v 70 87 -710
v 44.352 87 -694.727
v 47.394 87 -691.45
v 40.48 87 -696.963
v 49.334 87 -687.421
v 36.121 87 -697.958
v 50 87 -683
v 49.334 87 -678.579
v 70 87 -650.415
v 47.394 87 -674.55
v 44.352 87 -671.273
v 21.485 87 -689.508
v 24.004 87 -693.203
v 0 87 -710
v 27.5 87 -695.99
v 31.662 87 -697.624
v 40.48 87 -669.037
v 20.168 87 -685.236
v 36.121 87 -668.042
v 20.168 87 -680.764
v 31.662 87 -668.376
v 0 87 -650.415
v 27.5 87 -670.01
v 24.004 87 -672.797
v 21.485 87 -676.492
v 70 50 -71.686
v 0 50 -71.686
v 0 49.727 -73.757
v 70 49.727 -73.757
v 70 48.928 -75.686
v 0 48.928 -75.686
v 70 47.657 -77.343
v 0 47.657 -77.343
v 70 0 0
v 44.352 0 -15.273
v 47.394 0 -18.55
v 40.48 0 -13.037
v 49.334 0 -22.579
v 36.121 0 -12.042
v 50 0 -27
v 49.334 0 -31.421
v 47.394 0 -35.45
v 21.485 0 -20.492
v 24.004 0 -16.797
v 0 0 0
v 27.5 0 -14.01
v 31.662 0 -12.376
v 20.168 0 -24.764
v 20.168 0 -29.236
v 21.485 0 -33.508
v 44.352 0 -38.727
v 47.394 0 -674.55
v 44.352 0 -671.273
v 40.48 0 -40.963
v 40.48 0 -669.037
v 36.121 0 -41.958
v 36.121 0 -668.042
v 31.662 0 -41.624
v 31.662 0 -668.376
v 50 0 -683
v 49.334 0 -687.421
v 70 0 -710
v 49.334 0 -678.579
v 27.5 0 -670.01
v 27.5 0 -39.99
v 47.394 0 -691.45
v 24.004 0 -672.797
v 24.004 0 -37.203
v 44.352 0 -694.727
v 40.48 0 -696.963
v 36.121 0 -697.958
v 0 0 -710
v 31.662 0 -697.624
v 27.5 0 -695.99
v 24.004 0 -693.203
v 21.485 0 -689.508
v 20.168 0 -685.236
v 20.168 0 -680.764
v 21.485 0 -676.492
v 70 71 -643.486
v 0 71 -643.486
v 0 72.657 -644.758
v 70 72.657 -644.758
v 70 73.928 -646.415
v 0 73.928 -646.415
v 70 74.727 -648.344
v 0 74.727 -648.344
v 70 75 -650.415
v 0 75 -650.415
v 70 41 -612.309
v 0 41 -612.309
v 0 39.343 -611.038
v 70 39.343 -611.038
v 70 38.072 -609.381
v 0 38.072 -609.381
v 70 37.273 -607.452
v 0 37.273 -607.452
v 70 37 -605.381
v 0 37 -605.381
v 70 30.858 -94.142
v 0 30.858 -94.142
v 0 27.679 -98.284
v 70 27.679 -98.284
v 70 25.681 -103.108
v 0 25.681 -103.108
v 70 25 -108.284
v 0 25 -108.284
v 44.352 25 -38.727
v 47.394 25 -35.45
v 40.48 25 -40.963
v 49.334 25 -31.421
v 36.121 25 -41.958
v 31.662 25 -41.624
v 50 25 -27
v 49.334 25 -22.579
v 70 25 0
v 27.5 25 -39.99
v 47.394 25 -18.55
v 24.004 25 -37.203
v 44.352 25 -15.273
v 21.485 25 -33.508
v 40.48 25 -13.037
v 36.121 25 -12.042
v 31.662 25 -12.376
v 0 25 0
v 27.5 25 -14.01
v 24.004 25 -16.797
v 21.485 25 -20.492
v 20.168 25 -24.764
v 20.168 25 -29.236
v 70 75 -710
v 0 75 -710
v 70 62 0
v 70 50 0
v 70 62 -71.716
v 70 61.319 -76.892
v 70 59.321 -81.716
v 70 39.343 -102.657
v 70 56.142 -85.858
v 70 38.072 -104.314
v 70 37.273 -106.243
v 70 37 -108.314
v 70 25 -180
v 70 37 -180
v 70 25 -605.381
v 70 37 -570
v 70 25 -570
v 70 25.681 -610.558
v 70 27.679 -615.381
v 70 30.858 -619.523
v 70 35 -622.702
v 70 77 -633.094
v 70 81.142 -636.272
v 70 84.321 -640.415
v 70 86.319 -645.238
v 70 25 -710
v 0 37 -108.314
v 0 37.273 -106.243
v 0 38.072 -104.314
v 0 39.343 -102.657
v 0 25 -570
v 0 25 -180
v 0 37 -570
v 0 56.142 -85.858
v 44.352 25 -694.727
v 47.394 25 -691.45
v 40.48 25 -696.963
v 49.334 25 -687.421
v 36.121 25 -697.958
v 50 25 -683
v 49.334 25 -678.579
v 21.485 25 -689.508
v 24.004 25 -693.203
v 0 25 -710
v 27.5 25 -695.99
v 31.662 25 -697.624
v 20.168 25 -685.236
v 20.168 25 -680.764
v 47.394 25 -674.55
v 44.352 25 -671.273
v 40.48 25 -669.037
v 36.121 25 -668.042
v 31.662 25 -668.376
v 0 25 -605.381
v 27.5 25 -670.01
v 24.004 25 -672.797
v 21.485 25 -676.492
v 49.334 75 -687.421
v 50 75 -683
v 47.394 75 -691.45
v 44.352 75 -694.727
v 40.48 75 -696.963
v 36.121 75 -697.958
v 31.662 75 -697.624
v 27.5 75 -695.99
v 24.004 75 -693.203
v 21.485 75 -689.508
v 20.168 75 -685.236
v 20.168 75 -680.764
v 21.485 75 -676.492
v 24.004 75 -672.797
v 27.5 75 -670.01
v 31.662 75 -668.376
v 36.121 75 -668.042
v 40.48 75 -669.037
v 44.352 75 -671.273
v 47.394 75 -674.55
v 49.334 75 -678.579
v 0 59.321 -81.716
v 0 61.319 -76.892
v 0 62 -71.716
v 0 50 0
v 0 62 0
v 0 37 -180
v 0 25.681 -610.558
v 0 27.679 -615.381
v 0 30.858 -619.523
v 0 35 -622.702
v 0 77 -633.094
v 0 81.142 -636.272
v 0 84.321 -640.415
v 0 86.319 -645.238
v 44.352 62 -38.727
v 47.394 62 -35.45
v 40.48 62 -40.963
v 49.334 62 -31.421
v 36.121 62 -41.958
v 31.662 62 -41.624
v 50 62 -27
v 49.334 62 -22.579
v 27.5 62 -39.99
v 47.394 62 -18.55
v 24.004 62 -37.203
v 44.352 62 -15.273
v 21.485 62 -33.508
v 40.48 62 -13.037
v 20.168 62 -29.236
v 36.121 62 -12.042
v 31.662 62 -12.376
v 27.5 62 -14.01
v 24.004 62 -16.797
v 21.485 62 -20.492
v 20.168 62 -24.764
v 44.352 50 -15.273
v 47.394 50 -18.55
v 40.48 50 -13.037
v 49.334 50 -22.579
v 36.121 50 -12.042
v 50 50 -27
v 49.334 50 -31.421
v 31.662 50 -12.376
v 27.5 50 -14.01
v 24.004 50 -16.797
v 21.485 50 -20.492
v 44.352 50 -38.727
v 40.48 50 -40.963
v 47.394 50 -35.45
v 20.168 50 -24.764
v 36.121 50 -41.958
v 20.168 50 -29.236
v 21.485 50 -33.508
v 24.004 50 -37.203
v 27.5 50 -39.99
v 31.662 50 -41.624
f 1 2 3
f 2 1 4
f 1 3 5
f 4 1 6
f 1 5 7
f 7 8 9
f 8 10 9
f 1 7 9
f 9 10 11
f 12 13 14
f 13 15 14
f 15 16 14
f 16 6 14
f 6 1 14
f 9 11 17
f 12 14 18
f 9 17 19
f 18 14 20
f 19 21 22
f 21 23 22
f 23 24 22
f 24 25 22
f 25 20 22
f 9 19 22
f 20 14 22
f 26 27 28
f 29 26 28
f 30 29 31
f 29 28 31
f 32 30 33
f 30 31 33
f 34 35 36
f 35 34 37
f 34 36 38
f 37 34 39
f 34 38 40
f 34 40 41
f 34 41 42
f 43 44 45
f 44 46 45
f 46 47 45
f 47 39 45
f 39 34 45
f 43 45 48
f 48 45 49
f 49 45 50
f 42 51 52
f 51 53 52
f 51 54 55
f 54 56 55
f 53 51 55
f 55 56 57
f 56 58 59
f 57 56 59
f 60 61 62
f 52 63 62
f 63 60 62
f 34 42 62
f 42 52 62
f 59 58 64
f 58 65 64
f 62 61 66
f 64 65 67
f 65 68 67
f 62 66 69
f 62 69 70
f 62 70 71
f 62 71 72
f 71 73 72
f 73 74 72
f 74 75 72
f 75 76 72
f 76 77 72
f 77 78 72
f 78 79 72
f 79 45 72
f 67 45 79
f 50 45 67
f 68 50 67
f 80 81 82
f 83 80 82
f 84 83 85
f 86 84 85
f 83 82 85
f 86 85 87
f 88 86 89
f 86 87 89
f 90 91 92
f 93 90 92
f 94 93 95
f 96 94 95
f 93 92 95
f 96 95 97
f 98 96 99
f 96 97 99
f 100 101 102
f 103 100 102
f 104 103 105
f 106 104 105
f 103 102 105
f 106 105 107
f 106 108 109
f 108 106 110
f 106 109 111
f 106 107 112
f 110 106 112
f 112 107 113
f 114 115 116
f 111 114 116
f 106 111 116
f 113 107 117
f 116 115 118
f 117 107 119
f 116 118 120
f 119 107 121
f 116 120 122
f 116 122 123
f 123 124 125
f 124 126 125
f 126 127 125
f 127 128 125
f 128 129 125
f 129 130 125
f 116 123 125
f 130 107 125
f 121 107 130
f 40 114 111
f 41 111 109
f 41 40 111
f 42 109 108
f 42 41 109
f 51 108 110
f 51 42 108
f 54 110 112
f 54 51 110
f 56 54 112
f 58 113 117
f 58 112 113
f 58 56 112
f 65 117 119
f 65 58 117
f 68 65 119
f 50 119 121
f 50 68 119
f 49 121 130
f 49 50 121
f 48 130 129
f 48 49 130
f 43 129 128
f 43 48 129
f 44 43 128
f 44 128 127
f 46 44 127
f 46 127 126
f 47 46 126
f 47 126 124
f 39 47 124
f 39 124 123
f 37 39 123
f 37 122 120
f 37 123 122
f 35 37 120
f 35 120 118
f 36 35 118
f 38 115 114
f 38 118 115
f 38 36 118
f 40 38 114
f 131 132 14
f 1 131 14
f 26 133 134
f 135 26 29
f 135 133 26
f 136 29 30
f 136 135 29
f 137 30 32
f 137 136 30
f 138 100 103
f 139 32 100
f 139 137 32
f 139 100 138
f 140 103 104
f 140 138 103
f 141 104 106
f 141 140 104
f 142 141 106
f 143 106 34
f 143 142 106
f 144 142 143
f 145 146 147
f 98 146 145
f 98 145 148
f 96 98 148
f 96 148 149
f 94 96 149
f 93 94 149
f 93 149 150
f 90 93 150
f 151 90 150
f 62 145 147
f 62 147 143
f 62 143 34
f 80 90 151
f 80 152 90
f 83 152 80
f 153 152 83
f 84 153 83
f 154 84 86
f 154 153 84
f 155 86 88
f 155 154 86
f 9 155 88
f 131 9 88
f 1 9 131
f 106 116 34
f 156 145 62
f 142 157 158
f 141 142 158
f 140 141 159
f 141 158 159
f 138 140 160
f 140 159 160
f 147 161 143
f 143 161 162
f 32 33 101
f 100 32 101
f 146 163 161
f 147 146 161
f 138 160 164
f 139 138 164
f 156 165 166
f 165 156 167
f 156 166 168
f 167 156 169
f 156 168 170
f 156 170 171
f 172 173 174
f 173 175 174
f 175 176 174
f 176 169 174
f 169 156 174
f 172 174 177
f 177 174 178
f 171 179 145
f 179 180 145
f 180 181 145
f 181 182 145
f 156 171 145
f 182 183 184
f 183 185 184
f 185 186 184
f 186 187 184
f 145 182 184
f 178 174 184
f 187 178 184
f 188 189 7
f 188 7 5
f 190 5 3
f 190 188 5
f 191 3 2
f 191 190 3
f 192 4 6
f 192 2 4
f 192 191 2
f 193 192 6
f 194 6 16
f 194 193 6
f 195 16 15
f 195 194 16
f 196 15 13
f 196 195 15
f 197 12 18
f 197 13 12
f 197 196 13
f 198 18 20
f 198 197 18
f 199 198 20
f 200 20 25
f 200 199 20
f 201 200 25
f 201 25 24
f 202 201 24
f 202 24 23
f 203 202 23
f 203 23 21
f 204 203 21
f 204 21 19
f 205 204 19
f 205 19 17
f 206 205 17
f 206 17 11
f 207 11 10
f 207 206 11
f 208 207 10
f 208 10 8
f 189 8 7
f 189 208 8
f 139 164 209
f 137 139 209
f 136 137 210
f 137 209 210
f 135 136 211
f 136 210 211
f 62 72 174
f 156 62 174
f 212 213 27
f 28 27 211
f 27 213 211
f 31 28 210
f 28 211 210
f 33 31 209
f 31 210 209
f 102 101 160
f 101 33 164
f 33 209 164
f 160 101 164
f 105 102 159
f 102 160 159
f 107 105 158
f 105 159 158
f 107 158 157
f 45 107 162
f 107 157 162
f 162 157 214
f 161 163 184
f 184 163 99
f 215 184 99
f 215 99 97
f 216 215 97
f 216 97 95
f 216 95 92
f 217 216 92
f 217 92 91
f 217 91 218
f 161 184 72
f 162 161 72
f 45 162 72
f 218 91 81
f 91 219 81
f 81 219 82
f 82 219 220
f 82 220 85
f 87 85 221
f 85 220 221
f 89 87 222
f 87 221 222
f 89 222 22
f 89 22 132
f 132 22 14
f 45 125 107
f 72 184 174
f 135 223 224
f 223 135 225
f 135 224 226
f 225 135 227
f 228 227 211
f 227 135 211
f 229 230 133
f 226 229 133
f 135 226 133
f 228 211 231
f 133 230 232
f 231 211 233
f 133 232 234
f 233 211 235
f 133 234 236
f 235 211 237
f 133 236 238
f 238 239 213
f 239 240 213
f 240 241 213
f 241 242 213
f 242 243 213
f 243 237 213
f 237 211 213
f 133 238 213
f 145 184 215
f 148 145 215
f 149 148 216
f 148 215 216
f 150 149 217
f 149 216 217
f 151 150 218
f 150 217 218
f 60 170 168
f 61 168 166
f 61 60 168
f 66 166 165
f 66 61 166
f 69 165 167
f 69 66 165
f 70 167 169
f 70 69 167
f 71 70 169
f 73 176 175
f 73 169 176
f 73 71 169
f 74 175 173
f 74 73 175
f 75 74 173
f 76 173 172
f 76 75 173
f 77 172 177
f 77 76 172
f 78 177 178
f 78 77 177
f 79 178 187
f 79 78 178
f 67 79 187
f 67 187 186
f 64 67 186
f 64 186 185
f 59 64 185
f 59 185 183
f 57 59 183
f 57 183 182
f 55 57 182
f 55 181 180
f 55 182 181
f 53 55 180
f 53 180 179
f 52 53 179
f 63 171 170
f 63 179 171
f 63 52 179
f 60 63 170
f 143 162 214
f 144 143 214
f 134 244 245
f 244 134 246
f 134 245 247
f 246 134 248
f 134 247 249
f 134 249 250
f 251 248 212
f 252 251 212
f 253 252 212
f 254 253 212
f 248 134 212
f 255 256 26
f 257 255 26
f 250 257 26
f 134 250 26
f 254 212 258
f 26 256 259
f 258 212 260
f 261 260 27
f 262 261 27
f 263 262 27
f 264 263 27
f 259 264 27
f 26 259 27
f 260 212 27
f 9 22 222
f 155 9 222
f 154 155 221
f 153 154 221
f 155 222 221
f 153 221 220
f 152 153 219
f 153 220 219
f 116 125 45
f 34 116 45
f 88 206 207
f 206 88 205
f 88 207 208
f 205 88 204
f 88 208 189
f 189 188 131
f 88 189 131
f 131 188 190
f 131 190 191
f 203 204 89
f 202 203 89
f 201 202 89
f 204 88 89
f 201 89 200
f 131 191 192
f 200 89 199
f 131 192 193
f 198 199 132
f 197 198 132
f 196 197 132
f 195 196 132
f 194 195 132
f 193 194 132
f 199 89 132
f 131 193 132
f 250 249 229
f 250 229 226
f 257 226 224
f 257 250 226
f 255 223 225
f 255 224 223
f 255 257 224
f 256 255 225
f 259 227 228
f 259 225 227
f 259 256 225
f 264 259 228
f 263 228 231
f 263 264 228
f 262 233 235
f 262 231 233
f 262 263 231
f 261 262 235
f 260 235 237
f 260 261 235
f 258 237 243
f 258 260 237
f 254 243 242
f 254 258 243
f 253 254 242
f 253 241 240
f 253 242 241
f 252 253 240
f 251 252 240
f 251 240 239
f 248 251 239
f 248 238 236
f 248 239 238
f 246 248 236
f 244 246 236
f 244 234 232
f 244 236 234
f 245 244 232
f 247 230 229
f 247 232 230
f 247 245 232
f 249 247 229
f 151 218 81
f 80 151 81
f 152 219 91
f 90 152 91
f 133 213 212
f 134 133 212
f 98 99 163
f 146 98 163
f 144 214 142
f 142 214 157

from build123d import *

# Parameters (mm, degrees)
BOSS_EXTRUDE1_DEPTH = 70
SKETCH2_R           = 15
CUT_EXTRUDE1_DEPTH  = 88


with BuildPart() as part:
    # Sketch1 → Boss-Extrude1 (new body)
    with BuildSketch(Plane(origin=(0, 0, 0), x_dir=(0, 0, -1), z_dir=(1, 0, 0))):
        with BuildLine():
            ThreePointArc((94.142135624, 30.857864376), (100.6306026, 26.52240935), (108.284271247, 25))
            Line((108.284271247, 25), (0, 25))
            Line((0, 25), (0, 0))
            Line((0, 0), (710, 0))
            Line((710, 0), (710, 25))
            Line((710, 25), (605.381197846, 25))
            ThreePointArc((605.381197846, 25), (615.381197846, 27.679491924), (622.701705922, 35))
            Line((622.701705922, 35), (643.486315613, 71))
            ThreePointArc((643.486315613, 71), (646.414518843, 73.92820323), (650.414518843, 75))
            Line((650.414518843, 75), (710, 75))
            Line((710, 75), (710, 87))
            Line((710, 87), (650.414518843, 87))
            ThreePointArc((650.414518843, 87), (640.414518843, 84.320508076), (633.094010768, 77))
            Line((633.094010768, 77), (612.309401077, 41))
            ThreePointArc((612.309401077, 41), (609.381197846, 38.07179677), (605.381197846, 37))
            Line((605.381197846, 37), (570, 37))
            Line((570, 37), (570, 25))
            Line((570, 25), (180, 25))
            Line((180, 25), (180, 37))
            Line((180, 37), (108.313708499, 37))
            ThreePointArc((108.313708499, 37), (105.25224104, 37.60896374), (102.656854249, 39.343145751))
            Line((102.656854249, 39.343145751), (85.857864376, 56.142135624))
            ThreePointArc((85.857864376, 56.142135624), (79.3693974, 60.47759065), (71.715728753, 62))
            Line((71.715728753, 62), (0, 62))
            Line((0, 62), (0, 50))
            Line((0, 50), (71.686291501, 50))
            ThreePointArc((71.686291501, 50), (74.74775896, 49.39103626), (77.343145751, 47.656854249))
            Line((77.343145751, 47.656854249), (94.142135624, 30.857864376))
        make_face()
    extrude(amount=BOSS_EXTRUDE1_DEPTH)

    # Sketch2 → Cut-Extrude1 (cut, through all)
    with BuildSketch(Plane(origin=(0, 0, 0), x_dir=(1, 0, 0), z_dir=(0, 1, 0))):
        with Locations((35, 683)):
            Circle(SKETCH2_R)
        with Locations((35, 27)):
            Circle(SKETCH2_R)
    extrude(amount=CUT_EXTRUDE1_DEPTH, mode=Mode.SUBTRACT)


solid = part.part
